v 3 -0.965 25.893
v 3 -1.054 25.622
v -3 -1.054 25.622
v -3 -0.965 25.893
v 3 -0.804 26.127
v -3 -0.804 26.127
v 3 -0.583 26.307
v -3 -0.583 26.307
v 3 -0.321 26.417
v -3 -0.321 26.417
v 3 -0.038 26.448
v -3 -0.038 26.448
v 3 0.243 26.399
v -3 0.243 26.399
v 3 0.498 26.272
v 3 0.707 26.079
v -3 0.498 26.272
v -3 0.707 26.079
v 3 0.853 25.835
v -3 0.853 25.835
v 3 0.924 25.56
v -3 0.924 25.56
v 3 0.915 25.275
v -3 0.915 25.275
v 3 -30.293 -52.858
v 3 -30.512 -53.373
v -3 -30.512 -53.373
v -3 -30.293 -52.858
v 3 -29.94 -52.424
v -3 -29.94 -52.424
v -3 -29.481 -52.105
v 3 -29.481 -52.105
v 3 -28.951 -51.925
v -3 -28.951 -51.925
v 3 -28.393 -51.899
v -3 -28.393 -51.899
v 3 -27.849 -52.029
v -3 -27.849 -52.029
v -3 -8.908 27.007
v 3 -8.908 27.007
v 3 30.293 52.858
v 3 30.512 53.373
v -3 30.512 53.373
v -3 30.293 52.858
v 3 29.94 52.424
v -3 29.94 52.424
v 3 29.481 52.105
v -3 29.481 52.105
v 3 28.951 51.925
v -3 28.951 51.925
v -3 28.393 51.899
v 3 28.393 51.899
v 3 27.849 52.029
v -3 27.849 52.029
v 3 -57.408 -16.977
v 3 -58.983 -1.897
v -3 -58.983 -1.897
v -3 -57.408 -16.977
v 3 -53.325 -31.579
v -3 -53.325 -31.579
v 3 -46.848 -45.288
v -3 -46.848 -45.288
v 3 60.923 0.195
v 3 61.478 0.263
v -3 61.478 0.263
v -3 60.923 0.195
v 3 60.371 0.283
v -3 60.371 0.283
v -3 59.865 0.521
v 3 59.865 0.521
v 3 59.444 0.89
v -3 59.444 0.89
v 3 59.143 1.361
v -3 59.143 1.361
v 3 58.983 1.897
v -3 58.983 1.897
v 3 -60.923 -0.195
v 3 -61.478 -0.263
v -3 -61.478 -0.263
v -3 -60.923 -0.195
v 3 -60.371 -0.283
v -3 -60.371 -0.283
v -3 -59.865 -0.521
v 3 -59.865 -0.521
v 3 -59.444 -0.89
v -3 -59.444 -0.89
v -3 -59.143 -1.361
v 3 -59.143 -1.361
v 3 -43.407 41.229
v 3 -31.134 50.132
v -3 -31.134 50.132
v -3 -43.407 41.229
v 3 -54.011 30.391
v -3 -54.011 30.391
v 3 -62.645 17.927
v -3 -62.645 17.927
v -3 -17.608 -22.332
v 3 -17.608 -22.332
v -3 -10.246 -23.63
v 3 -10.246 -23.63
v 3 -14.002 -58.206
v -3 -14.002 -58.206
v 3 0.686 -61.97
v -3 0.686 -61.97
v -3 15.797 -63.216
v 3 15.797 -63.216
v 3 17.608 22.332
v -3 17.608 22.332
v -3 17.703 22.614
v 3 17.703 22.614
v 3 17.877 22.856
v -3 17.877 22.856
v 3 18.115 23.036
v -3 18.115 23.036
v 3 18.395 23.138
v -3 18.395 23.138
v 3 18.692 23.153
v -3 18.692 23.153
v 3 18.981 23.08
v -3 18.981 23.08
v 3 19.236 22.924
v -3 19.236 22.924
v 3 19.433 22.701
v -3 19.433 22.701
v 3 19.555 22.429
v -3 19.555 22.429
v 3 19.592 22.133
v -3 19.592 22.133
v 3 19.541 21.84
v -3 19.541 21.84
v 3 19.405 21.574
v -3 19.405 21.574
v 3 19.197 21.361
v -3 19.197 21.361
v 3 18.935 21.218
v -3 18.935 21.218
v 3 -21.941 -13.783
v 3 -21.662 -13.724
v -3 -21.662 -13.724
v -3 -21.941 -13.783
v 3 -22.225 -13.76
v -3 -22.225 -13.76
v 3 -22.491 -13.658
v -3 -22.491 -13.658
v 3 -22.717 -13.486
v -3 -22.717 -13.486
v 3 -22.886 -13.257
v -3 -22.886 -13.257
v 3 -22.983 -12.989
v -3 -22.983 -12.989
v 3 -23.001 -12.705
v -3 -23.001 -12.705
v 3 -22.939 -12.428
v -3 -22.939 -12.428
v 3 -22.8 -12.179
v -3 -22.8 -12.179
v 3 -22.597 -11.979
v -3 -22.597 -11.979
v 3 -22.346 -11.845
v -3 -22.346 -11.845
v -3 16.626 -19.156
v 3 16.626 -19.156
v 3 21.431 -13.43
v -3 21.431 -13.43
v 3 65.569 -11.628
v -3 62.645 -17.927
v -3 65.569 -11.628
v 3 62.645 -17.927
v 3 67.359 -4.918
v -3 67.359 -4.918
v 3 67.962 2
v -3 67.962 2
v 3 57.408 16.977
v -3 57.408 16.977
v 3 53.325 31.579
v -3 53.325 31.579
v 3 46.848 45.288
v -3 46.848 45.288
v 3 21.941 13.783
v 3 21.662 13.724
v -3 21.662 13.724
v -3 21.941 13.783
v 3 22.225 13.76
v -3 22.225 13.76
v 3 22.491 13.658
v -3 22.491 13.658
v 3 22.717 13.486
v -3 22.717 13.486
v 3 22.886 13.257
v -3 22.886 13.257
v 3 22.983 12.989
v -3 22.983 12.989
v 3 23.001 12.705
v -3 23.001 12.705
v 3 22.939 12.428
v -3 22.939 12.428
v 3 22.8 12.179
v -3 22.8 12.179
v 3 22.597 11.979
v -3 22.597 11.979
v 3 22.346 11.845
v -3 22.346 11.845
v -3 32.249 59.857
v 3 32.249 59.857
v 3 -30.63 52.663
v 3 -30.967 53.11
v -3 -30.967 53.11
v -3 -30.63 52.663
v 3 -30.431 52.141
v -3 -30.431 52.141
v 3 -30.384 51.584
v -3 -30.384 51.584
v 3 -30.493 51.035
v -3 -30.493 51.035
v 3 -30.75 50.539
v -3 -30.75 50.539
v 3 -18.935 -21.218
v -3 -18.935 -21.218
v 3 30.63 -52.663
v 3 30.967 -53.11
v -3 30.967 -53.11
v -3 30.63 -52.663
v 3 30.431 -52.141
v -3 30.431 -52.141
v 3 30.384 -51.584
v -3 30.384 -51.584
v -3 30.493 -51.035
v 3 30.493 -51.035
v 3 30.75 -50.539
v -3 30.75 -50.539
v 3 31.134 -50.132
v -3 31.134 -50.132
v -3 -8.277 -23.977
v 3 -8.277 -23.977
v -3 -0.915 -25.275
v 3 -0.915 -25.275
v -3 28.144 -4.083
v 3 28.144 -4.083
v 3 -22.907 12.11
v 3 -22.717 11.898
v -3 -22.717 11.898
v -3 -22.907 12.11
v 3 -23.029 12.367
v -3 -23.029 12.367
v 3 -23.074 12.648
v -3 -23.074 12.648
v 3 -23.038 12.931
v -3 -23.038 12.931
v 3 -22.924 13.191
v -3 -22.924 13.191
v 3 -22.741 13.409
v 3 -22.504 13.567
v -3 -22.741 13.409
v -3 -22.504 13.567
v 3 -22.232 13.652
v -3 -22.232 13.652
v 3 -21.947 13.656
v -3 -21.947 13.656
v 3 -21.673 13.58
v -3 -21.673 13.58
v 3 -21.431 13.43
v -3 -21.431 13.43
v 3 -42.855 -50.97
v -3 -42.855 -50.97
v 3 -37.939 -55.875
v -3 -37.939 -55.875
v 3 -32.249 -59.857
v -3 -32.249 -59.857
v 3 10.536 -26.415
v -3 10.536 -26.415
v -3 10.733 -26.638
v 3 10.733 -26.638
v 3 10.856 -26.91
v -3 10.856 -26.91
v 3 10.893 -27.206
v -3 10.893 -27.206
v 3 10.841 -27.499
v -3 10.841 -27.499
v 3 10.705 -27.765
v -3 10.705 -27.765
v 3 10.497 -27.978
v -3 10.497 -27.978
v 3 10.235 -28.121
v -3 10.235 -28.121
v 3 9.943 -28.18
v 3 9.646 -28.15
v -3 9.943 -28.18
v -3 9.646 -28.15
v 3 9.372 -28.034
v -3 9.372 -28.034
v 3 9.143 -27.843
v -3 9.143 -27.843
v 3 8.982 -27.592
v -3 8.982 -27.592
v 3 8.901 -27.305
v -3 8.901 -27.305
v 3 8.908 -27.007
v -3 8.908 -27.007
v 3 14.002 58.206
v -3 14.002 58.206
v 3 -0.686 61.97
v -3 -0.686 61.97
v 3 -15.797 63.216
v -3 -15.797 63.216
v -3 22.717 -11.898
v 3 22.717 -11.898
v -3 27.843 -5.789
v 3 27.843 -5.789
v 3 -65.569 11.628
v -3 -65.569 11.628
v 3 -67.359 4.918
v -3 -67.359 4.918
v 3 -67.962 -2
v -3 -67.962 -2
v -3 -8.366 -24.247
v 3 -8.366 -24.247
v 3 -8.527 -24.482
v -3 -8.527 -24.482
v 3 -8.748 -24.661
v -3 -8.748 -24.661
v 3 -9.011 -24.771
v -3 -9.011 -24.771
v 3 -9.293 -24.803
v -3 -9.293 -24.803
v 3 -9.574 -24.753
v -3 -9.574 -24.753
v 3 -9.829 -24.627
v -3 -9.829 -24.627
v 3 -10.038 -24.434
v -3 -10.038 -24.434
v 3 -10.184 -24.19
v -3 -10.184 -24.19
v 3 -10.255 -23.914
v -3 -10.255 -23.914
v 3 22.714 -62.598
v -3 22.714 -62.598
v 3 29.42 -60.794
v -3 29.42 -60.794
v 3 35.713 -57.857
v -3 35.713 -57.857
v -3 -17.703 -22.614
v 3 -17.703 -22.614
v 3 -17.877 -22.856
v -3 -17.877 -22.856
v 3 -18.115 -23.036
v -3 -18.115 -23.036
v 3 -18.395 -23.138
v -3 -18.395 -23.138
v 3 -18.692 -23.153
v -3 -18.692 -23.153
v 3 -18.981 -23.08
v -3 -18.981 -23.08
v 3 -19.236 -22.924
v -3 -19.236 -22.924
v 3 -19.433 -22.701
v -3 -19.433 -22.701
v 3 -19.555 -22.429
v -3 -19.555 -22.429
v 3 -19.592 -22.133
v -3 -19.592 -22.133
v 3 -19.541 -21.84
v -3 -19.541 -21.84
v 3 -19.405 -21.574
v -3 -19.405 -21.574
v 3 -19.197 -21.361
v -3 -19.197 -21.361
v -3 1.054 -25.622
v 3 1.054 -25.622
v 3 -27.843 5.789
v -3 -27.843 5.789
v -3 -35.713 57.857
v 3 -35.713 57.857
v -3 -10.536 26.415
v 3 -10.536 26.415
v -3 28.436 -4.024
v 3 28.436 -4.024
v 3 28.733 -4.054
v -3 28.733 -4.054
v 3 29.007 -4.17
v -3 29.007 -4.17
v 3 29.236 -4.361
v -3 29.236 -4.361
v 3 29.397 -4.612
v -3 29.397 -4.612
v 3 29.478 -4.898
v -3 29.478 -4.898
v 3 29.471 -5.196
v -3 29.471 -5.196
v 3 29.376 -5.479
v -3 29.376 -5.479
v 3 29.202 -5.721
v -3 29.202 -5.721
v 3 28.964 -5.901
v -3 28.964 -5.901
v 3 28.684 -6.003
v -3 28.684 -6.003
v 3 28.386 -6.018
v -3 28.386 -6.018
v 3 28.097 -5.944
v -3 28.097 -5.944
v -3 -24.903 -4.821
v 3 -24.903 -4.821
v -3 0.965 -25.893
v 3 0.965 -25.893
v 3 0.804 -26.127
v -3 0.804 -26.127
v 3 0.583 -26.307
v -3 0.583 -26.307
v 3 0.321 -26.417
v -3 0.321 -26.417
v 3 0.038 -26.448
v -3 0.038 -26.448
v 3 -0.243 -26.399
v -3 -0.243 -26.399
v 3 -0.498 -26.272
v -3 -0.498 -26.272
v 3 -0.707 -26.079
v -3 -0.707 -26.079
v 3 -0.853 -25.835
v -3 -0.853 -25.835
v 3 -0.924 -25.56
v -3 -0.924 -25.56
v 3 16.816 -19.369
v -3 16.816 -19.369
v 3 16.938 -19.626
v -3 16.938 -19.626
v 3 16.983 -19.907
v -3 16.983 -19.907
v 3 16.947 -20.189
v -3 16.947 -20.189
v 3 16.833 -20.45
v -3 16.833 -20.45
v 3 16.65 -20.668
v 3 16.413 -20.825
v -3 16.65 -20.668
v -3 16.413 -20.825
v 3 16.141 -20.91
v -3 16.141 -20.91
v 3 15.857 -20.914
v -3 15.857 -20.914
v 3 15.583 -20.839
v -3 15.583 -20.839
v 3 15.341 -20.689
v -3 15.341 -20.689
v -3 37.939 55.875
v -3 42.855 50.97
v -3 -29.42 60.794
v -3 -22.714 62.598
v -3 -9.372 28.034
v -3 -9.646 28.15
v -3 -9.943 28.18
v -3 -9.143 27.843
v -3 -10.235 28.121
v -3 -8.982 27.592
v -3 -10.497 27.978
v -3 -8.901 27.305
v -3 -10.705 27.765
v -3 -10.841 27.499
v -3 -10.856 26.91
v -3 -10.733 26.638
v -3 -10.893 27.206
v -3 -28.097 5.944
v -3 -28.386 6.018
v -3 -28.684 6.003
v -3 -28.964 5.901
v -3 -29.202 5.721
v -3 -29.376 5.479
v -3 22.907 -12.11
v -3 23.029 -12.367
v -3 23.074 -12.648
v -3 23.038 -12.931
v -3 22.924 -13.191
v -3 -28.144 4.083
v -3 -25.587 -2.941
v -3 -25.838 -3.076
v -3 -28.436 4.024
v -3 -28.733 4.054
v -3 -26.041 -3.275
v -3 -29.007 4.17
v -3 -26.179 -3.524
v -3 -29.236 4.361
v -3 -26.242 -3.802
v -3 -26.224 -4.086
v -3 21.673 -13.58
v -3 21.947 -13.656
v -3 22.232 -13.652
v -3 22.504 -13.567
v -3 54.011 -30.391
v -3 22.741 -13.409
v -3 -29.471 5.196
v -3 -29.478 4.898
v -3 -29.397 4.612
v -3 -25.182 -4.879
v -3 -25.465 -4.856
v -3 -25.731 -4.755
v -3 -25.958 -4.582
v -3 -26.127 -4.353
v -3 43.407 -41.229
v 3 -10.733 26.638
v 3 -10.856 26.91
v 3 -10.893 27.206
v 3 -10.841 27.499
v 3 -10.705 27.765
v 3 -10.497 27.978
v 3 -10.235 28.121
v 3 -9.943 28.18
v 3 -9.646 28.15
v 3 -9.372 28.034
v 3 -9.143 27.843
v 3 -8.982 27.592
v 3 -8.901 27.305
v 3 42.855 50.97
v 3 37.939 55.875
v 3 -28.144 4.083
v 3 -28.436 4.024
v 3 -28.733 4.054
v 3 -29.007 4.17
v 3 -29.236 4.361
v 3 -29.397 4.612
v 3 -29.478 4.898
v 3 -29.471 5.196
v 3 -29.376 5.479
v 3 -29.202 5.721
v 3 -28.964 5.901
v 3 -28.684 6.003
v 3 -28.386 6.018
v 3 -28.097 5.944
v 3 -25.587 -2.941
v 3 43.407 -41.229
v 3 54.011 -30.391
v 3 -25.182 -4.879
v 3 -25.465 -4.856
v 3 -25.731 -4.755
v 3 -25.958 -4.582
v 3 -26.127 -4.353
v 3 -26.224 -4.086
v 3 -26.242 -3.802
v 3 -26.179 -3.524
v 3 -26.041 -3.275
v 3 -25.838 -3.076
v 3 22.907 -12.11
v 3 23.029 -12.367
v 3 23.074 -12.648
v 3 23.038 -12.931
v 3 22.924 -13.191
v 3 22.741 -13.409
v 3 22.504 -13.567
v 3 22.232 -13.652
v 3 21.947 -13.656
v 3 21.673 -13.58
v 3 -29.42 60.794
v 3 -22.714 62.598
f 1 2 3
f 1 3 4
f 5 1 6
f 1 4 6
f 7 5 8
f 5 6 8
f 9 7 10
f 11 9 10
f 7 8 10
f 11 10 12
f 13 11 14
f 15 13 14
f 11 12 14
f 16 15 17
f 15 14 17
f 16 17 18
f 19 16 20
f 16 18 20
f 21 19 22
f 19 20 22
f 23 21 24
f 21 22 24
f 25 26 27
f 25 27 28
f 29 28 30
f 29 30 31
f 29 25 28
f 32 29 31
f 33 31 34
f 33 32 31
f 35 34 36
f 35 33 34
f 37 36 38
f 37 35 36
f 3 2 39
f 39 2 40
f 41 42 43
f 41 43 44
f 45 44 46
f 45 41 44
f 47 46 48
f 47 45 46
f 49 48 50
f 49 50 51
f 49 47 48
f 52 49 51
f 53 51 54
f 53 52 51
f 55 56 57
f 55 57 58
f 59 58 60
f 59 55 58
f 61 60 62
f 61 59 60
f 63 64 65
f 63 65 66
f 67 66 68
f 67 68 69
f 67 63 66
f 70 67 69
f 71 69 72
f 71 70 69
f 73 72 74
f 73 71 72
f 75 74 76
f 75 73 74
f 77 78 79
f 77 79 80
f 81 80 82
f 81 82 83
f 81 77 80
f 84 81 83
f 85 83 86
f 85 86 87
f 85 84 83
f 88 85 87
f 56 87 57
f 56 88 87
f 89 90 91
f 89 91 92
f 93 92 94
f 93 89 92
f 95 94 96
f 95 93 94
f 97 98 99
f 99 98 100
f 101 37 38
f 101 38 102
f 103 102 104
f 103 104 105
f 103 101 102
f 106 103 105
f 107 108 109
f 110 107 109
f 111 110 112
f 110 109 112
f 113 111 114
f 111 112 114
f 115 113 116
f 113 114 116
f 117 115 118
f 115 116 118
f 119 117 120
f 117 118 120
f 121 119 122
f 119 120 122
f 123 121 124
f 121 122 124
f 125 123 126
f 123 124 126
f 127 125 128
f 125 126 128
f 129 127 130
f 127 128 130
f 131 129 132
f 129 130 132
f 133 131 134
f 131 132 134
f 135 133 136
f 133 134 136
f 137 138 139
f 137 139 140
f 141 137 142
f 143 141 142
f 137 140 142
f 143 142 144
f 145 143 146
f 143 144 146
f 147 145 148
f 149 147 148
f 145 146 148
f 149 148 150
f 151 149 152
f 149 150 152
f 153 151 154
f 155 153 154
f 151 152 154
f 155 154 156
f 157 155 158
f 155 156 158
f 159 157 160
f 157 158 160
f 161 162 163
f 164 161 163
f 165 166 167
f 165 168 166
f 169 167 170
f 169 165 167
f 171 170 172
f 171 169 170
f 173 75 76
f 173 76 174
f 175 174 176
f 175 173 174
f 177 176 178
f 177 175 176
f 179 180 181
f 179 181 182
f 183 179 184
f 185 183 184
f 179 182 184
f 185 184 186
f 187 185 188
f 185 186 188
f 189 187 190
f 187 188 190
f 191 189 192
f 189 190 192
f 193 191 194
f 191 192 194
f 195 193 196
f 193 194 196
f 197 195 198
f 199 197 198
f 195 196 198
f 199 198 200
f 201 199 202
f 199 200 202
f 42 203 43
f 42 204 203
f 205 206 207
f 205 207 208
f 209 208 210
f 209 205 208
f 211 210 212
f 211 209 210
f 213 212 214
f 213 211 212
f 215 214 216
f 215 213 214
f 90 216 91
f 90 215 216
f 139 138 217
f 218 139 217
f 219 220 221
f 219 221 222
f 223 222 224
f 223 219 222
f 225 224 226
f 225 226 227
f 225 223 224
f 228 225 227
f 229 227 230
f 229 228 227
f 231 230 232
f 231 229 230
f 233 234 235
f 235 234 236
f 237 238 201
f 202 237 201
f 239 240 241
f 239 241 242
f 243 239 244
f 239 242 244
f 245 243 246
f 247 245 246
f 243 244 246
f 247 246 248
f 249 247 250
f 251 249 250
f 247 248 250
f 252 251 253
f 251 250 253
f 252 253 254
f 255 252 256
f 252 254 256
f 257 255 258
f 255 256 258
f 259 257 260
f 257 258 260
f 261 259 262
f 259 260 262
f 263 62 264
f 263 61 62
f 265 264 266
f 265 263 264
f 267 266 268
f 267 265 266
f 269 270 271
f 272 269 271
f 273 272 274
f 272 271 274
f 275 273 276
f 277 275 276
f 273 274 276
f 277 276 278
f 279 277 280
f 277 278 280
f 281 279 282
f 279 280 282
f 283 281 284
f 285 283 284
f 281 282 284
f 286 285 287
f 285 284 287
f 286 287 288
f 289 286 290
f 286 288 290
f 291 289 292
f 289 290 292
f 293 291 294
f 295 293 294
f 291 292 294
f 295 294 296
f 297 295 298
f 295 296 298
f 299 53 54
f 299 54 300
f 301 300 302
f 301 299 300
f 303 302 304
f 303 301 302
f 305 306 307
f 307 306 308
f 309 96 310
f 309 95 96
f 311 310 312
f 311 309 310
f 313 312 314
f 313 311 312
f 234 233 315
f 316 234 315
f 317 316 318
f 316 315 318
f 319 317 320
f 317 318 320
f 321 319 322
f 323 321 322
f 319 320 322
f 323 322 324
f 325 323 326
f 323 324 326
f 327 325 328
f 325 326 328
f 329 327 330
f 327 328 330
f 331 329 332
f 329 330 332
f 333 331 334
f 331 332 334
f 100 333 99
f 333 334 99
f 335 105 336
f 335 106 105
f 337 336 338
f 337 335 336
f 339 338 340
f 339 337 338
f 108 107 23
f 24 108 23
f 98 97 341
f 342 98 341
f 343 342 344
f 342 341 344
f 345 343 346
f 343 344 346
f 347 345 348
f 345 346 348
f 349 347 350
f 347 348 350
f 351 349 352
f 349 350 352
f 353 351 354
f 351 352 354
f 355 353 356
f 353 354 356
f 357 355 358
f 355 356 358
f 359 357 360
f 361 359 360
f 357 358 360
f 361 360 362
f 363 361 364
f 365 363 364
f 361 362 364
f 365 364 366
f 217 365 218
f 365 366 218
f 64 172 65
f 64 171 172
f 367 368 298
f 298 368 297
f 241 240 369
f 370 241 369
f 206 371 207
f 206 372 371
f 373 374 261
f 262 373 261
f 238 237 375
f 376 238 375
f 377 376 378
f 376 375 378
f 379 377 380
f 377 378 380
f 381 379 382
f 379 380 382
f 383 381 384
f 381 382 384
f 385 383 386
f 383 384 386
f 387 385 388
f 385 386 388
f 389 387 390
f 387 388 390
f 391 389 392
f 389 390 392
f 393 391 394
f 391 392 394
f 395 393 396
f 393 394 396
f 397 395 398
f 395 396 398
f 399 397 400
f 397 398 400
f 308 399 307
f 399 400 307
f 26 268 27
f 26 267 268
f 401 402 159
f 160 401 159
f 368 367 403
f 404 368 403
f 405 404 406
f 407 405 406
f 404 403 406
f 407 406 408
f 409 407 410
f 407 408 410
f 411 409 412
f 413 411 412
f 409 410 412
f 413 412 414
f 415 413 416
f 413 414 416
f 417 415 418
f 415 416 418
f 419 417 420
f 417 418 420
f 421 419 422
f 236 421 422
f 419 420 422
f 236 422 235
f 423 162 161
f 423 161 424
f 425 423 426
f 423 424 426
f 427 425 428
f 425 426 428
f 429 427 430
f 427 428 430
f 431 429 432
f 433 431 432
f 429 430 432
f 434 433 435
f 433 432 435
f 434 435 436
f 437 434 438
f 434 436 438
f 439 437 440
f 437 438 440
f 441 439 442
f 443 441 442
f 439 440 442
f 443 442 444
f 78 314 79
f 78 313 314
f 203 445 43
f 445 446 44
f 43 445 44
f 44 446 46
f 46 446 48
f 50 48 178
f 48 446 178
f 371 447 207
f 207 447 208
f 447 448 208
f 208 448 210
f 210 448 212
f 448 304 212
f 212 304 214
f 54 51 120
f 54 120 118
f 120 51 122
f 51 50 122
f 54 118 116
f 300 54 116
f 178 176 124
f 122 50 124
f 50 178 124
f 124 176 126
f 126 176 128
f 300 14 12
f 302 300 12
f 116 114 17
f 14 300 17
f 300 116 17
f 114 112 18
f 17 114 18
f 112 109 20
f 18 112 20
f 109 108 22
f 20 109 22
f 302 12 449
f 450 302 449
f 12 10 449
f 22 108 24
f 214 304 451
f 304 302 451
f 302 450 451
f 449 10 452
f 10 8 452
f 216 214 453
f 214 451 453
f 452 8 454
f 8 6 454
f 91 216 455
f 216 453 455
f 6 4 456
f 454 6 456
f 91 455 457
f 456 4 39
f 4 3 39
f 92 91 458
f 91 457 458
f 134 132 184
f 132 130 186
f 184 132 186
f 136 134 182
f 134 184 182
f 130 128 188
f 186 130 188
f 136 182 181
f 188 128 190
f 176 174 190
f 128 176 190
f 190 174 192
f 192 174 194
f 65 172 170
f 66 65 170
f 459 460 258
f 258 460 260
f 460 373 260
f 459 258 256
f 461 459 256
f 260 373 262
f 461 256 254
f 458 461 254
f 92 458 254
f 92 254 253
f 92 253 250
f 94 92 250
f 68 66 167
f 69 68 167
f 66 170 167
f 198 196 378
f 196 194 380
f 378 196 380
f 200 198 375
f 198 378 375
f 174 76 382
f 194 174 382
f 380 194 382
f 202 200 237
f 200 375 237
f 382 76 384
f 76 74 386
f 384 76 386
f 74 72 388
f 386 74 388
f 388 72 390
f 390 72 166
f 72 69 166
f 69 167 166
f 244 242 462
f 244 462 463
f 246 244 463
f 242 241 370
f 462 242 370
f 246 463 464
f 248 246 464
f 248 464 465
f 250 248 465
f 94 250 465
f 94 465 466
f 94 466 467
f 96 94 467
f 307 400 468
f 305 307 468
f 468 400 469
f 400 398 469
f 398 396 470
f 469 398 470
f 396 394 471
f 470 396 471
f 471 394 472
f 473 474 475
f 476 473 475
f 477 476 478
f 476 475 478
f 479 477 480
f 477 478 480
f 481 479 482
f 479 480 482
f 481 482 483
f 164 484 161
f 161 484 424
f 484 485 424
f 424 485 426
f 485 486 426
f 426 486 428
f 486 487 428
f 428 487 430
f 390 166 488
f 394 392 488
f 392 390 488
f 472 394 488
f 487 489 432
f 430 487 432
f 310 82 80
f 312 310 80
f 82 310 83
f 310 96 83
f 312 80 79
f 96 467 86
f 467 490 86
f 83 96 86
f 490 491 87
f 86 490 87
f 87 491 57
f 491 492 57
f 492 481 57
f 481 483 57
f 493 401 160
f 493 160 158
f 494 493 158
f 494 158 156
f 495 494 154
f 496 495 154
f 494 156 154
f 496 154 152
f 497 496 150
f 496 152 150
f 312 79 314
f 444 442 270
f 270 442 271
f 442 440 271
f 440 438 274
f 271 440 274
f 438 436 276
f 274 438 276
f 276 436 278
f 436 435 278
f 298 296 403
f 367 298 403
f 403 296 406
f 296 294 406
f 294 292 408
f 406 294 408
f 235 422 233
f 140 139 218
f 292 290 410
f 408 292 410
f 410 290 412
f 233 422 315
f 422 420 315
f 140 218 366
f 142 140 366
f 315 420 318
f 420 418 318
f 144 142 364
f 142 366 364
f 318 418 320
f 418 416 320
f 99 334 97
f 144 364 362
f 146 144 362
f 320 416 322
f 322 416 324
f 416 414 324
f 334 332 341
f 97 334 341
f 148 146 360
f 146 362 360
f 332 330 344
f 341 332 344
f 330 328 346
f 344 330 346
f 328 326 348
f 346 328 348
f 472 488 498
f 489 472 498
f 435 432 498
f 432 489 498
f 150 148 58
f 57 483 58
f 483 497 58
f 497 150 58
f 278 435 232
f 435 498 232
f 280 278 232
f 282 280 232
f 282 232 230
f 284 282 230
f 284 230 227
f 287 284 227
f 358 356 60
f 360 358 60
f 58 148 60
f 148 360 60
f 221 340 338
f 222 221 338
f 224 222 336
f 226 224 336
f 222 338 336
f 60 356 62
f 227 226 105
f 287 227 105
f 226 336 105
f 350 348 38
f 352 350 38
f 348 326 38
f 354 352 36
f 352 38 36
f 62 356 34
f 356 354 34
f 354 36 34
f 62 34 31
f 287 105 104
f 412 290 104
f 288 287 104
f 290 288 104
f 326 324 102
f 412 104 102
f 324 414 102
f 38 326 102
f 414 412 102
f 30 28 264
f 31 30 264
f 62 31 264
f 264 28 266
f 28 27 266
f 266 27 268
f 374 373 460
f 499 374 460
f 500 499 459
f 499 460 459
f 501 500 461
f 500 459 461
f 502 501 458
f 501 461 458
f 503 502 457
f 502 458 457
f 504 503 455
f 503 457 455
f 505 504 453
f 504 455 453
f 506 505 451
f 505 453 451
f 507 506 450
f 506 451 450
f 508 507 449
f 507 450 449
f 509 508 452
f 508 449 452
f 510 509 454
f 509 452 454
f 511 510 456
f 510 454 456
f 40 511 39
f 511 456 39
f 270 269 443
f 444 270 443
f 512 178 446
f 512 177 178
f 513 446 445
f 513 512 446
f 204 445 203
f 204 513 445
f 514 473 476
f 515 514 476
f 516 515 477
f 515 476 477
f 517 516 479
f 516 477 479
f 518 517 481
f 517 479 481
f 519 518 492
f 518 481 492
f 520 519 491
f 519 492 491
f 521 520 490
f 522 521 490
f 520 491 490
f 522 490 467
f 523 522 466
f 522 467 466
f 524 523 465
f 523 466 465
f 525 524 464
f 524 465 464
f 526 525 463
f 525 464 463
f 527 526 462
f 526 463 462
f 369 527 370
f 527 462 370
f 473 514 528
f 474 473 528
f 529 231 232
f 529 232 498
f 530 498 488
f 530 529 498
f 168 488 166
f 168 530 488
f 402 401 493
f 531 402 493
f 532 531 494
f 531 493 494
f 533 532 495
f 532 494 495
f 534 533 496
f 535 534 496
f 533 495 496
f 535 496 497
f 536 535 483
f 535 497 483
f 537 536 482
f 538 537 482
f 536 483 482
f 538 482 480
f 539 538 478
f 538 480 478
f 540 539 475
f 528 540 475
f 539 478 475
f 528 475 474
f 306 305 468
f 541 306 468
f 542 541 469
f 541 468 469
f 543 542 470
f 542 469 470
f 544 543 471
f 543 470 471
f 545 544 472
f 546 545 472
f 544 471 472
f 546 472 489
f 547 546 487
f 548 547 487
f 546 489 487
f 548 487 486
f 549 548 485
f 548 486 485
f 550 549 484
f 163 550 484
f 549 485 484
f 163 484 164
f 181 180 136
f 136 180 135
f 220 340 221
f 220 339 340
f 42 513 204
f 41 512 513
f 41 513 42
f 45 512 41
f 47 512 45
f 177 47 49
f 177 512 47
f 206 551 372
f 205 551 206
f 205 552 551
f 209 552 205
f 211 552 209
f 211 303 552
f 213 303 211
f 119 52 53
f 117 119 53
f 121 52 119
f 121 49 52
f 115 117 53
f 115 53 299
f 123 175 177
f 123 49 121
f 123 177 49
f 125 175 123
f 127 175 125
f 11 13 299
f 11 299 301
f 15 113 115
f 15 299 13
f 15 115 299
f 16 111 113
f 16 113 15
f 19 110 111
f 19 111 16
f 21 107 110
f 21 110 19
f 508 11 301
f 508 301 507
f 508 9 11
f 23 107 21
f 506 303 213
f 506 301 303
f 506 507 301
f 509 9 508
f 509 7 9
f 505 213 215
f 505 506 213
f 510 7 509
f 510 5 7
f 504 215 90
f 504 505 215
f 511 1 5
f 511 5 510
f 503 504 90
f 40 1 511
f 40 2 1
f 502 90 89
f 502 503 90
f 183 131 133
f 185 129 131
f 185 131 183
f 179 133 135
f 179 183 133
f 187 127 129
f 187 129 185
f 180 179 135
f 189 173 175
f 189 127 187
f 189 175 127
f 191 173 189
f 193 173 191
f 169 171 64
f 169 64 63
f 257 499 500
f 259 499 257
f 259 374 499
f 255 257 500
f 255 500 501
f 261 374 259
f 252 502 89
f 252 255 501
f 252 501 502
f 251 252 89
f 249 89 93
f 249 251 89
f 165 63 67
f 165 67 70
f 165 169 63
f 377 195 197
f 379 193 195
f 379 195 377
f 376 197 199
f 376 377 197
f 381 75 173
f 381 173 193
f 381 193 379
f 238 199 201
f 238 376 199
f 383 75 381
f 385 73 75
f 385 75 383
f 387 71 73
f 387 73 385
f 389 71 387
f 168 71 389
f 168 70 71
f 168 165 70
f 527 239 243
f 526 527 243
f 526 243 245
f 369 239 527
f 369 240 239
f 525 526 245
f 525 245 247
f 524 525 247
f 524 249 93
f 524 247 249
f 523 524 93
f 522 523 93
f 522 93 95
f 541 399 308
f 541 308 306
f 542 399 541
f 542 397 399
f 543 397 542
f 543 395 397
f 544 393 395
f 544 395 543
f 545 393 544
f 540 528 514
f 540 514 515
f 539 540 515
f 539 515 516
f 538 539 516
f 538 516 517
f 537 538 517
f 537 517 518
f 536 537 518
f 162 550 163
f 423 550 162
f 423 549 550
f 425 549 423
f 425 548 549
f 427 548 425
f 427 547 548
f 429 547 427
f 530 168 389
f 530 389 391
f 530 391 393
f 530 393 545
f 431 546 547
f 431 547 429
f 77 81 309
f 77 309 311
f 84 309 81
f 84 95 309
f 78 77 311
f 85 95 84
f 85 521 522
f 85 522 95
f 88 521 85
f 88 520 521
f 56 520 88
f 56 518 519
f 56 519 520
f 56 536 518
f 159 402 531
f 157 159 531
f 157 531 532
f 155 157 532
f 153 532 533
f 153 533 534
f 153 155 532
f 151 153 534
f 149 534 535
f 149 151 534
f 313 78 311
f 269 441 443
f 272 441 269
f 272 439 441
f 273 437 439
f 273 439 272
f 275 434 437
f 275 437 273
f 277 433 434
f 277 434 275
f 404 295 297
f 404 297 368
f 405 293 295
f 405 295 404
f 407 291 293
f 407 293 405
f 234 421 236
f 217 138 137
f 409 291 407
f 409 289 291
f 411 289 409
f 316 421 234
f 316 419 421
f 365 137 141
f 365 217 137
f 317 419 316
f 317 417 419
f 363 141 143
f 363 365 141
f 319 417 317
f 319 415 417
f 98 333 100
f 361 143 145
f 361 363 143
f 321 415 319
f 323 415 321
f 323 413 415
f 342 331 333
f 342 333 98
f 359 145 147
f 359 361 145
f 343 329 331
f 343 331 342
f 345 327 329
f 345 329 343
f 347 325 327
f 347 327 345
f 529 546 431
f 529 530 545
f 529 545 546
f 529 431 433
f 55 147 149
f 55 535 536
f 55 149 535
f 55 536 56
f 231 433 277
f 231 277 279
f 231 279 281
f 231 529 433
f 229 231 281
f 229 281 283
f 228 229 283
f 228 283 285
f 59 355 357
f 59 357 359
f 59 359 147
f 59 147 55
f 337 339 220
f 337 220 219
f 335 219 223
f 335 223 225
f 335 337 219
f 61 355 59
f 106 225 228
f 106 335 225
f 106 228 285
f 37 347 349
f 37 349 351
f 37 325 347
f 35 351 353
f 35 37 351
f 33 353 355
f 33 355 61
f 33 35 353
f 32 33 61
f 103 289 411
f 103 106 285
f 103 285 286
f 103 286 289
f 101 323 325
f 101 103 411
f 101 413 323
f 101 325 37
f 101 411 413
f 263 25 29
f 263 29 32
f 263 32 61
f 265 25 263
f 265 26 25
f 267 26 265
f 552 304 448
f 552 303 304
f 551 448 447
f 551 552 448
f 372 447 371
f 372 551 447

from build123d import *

# Parameters (mm, degrees)
SKETCH1_R                = 59
EXTRUDE1_DEPTH           = 3
EXTRUDE2_DEPTH           = 3
CIRPATTERN1_COUNT        = 6
F_2_0_2_DIAMETER_HOLE1_D = 2
F_2_0_2_DIAMETER_HOLE3_D = 2
F_2_0_2_DIAMETER_HOLE4_D = 2
CIRPATTERN2_COUNT        = 6
CIRPATTERN3_COUNT        = 3
CIRPATTERN3_ANGLE        = 120


with BuildPart() as part:
    # Sketch1 → Extrude1 (new, symmetric)
    with BuildSketch(Plane(origin=(0, 0, 0), x_dir=(0, 0, -1), z_dir=(1, 0, 0))):
        Circle(SKETCH1_R)
        Polygon((27.180842557, 9.893017633), (5.022816688, 28.485808967), (-22.158025869, 18.592791334), (-27.180842557, -9.893017633), (-5.022816688, -28.485808967), (22.158025869, -18.592791334), align=None, mode=Mode.SUBTRACT)
    extrude(amount=EXTRUDE1_DEPTH, both=True)

    # Sketch2 → Extrude2 (add, symmetric)
    with BuildSketch(Plane(origin=(0, 0, 0), x_dir=(0, 0, -1), z_dir=(1, 0, 0))):
        with BuildLine():
            Line((-2, 67.961805723), (-0.262709442, 61.478149092))
            ThreePointArc((-0.262709442, 61.478149092), (-0.58620663, 59.77173183), (-2.122608272, 58.961805723))
            ThreePointArc((-2.122608272, 58.961805723), (28.679663449, 51.560419941), (51.21368579, 29.294340542))
            ThreePointArc((51.21368579, 29.294340542), (36.791707484, 48.186627241), (17.927108603, 62.644803614))
            ThreePointArc((17.927108603, 62.644803614), (8.312130826, 66.609702921), (-2, 67.961805723))
        make_face()
    extrude2 = extrude(amount=EXTRUDE2_DEPTH, both=True)

    # CirPattern1: Extrude2 ×6 about axis
    cirpattern1_axis = Axis((0, 0, 0), (1, 0, 0))
    for i in range(1, CIRPATTERN1_COUNT):
        add(extrude2.rotate(cirpattern1_axis, i * 360 / CIRPATTERN1_COUNT))

    # Ø2.0 (2) Diameter Hole1 (through all)
    with Locations(Plane(origin=(3, 0, 0), x_dir=(0, 0, -1), z_dir=(1, 0, 0))):
        with Locations((5.022816688, 28.485808967), (27.180842557, 9.893017633), (22.158025869, -18.592791334), (-5.022816688, -28.485808967), (-27.180842557, -9.893017633), (-22.158025869, 18.592791334)):
            Hole(F_2_0_2_DIAMETER_HOLE1_D / 2)

    # Ø2.0 (2) Diameter Hole3 (through all)
    with Locations(Plane(origin=(3, 0, 0), x_dir=(0, 0, -1), z_dir=(1, 0, 0))):
        with Locations((12.664173459, 22.073949319)):
            f_2_0_2_diameter_hole3 = Hole(F_2_0_2_DIAMETER_HOLE3_D / 2)

    # Ø2.0 (2) Diameter Hole4 (through all)
    with Locations(Plane(origin=(3, 0, 0), x_dir=(0, 0, -1), z_dir=(1, 0, 0))):
        with Locations((19.922508008, 15.983483476)):
            f_2_0_2_diameter_hole4 = Hole(F_2_0_2_DIAMETER_HOLE4_D / 2)

    # CirPattern2: Ø2.0 (2) Diameter Hole3 ×6 about axis
    cirpattern2_axis = Axis((0, 0, 0), (1, 0, 0))
    for i in range(1, CIRPATTERN2_COUNT):
        add(f_2_0_2_diameter_hole3.rotate(cirpattern2_axis, i * 360 / CIRPATTERN2_COUNT), mode=Mode.SUBTRACT)

    # CirPattern3: Ø2.0 (2) Diameter Hole4 ×3 about axis
    cirpattern3_axis = Axis((0, 0, 0), (-1, 0, 0))
    for i in range(1, CIRPATTERN3_COUNT):
        add(f_2_0_2_diameter_hole4.rotate(cirpattern3_axis, i * CIRPATTERN3_ANGLE / (CIRPATTERN3_COUNT - 1)), mode=Mode.SUBTRACT)


solid = part.part
